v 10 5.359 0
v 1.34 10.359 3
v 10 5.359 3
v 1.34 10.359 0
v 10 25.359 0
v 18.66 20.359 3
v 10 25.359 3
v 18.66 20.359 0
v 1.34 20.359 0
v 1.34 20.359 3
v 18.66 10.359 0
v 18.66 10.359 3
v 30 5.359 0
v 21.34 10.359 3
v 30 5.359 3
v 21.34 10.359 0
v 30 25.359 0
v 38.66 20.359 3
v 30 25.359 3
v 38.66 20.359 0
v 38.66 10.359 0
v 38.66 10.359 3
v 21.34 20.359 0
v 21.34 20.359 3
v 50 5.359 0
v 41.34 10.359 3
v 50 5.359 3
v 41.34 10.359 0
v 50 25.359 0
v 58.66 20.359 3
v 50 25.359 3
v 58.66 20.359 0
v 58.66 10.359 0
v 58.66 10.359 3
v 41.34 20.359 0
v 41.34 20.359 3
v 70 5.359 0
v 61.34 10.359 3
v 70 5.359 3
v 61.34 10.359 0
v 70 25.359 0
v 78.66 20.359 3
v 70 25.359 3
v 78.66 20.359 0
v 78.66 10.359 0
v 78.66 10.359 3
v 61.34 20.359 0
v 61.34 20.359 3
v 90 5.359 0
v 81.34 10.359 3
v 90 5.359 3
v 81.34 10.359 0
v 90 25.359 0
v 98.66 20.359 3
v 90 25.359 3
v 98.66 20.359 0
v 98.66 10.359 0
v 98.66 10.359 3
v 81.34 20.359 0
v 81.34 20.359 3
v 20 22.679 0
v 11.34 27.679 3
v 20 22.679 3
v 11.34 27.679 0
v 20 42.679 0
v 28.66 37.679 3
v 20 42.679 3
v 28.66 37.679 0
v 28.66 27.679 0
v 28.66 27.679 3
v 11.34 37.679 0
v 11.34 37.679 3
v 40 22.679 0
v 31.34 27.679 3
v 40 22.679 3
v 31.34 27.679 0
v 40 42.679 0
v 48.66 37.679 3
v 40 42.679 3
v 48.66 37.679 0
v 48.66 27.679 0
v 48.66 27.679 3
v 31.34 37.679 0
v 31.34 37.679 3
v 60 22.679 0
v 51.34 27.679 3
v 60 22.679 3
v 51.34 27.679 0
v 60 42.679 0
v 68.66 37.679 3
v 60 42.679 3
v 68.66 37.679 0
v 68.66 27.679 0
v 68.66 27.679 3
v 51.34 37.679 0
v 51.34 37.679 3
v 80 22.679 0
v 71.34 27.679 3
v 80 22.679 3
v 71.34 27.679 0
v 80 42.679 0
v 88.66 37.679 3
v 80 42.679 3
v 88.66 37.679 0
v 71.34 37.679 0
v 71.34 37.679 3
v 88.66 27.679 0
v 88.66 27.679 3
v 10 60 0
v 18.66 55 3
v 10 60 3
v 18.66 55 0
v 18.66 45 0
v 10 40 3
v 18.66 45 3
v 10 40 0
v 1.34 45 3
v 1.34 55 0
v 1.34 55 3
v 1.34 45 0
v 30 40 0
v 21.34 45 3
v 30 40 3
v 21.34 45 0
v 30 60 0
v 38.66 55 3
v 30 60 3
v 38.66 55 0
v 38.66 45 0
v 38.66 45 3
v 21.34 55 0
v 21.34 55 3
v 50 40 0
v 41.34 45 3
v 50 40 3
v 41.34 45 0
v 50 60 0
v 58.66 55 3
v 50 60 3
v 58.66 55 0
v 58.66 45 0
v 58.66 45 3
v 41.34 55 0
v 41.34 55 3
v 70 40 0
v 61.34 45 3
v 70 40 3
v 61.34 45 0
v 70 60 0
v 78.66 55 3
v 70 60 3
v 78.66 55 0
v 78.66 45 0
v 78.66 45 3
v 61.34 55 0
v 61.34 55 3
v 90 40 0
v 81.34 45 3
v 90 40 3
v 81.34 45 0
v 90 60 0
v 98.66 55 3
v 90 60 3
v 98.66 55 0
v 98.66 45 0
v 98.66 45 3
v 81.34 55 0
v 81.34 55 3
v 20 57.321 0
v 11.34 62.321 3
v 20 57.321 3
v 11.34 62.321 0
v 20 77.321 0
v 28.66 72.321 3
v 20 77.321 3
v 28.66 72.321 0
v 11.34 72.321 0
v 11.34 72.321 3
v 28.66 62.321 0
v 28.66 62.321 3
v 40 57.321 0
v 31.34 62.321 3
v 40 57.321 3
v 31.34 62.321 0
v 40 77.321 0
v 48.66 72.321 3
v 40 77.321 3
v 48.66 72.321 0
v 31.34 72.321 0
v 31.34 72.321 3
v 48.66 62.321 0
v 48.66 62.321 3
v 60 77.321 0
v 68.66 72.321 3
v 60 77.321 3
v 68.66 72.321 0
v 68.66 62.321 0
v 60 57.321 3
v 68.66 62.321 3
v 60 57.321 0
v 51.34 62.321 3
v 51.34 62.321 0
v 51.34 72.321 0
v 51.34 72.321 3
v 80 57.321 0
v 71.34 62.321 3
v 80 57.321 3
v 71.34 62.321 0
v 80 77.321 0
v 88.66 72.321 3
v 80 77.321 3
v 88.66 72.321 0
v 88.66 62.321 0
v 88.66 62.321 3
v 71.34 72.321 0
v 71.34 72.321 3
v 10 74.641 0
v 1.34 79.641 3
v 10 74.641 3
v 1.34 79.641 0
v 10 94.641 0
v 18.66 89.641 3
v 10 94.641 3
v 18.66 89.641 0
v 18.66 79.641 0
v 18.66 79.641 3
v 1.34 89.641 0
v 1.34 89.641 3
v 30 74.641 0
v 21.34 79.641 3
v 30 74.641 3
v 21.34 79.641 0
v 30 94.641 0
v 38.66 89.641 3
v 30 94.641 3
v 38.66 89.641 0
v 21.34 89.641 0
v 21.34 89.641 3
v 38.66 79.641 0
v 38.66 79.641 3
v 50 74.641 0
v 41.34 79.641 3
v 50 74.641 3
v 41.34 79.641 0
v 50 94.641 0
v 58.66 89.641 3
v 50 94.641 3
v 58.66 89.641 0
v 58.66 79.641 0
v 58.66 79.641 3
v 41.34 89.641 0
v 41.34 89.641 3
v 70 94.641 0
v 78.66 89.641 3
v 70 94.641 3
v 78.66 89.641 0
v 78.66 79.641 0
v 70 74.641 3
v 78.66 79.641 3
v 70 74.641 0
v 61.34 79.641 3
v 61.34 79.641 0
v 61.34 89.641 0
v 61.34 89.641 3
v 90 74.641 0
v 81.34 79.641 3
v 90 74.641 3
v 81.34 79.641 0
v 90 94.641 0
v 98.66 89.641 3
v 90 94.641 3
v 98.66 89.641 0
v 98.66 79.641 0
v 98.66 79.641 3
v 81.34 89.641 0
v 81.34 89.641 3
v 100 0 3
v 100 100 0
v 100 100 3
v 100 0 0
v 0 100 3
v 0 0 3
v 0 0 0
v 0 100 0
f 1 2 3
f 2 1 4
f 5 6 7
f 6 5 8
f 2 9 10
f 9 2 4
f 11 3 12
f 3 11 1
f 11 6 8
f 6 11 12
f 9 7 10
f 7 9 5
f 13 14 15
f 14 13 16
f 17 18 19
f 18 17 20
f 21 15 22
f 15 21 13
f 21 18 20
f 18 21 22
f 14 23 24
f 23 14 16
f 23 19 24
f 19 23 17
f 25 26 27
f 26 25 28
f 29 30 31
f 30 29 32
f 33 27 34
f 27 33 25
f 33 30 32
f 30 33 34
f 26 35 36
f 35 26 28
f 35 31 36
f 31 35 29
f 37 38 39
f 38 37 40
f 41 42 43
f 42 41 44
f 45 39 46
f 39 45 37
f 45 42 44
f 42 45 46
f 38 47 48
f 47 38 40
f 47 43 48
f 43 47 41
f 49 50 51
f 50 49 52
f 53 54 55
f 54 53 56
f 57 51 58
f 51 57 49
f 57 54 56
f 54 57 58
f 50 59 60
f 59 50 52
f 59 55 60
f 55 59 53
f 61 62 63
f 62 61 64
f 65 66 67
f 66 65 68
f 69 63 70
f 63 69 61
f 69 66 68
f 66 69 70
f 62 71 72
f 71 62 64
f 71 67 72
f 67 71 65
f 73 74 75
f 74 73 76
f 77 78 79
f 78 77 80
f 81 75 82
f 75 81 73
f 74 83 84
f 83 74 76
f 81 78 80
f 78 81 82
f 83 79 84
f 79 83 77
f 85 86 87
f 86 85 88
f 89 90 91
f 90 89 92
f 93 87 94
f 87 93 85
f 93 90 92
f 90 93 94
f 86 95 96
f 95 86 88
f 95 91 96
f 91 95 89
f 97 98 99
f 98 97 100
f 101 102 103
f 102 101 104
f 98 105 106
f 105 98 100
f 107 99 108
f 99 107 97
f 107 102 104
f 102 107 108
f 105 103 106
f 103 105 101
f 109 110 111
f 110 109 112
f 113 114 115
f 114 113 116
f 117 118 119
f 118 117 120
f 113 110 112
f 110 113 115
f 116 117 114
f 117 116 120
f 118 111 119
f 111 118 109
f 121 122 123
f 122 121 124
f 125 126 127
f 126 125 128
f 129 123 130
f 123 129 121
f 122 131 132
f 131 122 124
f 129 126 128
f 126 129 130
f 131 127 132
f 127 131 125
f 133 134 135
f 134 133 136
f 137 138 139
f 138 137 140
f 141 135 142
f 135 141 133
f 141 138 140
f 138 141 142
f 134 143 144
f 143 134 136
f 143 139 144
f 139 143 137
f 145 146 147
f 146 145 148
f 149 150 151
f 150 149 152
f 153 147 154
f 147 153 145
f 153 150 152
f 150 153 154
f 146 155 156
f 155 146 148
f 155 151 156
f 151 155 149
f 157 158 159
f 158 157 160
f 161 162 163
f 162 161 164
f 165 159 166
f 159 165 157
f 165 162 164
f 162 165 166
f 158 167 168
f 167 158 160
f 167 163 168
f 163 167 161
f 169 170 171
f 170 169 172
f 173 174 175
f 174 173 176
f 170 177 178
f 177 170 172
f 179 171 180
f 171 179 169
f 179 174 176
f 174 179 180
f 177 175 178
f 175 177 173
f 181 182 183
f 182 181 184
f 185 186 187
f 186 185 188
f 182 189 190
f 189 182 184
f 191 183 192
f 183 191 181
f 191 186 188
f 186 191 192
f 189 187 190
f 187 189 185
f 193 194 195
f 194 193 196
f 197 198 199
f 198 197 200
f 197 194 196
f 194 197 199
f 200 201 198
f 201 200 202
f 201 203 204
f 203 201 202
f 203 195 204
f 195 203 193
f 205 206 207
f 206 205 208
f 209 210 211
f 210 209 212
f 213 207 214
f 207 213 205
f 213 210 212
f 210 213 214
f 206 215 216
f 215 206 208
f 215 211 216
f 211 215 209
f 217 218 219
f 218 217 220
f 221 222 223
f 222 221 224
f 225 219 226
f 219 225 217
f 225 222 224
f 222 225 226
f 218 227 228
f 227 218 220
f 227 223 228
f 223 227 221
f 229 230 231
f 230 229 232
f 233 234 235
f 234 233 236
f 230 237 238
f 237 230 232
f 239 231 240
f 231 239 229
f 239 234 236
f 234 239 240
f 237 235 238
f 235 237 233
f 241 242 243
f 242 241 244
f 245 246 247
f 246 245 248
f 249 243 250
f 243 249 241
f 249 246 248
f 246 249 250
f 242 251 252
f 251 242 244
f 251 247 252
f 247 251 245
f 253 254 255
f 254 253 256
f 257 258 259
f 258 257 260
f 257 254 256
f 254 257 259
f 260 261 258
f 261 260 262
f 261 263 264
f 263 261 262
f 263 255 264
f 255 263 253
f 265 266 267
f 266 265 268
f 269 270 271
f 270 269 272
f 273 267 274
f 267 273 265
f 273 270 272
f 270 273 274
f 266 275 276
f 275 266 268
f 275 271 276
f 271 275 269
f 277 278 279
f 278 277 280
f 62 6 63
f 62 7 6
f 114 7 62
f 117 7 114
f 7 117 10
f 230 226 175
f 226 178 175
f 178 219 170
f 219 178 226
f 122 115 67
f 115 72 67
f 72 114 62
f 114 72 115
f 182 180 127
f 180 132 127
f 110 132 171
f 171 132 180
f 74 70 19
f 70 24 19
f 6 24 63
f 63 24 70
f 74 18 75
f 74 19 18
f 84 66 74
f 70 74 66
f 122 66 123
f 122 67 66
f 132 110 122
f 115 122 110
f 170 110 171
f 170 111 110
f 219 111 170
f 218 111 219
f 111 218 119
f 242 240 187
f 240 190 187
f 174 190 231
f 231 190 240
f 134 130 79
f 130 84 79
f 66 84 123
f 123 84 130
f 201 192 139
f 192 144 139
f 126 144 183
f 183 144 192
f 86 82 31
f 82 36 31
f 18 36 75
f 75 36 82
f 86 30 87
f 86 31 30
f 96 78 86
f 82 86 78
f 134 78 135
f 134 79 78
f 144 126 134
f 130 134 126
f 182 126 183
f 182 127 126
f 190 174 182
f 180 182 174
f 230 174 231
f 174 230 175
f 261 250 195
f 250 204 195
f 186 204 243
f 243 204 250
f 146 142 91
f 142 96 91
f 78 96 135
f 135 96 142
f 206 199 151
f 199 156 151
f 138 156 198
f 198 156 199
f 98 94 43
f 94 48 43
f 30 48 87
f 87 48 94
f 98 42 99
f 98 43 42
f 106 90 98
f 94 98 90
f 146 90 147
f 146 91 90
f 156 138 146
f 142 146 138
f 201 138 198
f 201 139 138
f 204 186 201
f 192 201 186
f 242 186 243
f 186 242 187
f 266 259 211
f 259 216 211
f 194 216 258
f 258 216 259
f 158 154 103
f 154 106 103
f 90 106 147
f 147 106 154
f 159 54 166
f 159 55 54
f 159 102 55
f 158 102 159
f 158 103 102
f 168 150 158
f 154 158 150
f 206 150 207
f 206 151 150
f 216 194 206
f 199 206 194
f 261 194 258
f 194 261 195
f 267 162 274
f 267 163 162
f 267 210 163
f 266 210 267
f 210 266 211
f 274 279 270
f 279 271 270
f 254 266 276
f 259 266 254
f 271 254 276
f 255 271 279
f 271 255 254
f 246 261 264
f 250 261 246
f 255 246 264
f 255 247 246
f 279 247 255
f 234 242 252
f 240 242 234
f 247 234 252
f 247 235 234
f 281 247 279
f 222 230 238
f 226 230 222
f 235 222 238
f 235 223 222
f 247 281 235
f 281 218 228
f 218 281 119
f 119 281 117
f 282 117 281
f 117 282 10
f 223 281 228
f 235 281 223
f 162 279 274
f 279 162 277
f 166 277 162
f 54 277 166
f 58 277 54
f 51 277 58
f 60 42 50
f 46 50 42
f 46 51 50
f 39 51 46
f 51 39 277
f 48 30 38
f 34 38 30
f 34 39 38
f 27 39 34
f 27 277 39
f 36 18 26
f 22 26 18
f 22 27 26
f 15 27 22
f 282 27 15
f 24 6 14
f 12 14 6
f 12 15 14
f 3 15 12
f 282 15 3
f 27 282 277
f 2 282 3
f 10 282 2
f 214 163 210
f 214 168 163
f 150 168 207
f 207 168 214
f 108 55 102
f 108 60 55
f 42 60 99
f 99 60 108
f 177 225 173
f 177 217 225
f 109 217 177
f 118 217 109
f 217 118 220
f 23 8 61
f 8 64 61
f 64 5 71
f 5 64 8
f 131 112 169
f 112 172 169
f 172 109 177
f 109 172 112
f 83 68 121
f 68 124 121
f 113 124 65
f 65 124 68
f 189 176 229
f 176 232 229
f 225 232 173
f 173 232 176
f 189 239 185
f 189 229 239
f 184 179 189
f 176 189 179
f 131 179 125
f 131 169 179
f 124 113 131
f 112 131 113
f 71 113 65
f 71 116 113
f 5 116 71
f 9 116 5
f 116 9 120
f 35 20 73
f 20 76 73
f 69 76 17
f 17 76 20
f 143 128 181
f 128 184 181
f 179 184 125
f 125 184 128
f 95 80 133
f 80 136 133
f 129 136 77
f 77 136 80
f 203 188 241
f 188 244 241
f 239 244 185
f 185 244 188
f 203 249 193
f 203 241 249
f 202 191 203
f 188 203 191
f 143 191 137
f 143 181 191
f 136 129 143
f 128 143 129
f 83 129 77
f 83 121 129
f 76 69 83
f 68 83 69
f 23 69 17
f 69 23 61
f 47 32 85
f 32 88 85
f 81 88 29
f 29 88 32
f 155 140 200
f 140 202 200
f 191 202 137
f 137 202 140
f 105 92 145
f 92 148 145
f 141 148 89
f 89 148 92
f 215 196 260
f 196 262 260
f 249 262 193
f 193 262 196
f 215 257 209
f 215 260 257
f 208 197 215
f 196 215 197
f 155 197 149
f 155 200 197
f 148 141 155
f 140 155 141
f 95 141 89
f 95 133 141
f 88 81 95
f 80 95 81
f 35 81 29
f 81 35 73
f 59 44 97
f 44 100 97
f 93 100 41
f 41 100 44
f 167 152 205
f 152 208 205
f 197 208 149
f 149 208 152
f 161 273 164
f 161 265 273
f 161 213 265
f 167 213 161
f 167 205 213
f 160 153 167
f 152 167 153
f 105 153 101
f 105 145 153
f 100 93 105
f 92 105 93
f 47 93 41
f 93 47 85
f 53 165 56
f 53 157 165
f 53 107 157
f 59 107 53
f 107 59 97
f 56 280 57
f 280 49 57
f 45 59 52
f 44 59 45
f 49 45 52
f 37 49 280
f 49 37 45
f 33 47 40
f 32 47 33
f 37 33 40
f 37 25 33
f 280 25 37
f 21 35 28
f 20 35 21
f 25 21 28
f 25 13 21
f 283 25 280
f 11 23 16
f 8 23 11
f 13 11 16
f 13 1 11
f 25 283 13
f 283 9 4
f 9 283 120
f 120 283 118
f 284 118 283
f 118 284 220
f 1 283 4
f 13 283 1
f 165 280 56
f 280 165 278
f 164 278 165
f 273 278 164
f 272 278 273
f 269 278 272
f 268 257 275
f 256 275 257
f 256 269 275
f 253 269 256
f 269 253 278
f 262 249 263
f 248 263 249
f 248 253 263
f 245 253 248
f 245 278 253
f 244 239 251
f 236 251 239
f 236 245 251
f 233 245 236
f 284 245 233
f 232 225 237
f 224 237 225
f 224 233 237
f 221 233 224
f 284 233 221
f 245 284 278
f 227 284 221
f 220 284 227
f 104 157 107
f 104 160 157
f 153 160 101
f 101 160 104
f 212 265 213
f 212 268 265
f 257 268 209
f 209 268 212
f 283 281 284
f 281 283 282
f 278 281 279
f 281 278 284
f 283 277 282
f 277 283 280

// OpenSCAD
// created by IndiePandaaaaa | Lukas

function hexagon_get_inner_diameter(single_outer_diameter = 20) = tan(60) * (single_outer_diameter / 2);

function hexagon_inbetween_distance_x(single_outer_diameter = 20) = single_outer_diameter -
    hexagon_get_inner_diameter(single_outer_diameter);

function hexagon_get_y_inner_element_additional_height(single_outer_diameter = 20) = single_outer_diameter / 2 +
        hexagon_inbetween_distance_x(single_outer_diameter) * cos(30) + (single_outer_diameter / 2) * cos(60);

function hexagon_get_y_outer_element_height(single_outer_diameter = 20) = single_outer_diameter;

function hexagon_get_y_next_structure(single_outer_diameter = 20) = (single_outer_diameter / 2 * 3) +
            hexagon_inbetween_distance_x(single_outer_diameter) * cos(30) * 2;

function hexagon_get_y_element_height(single_outer_diameter = 20) = hexagon_get_y_outer_element_height(
single_outer_diameter) + hexagon_get_y_inner_element_additional_height(single_outer_diameter);

function hexagon_get_x_element_count(width, single_outer_diameter = 20) = floor(width / single_outer_diameter);

function hexagon_get_y_element_count(depth, single_outer_diameter = 20) = floor(((depth - (hexagon_get_y_element_height(
single_outer_diameter) -
    hexagon_get_y_next_structure(single_outer_diameter))) / hexagon_get_y_next_structure(single_outer_diameter)) * 2);

function hexagon_get_used_width(width, single_outer_diameter = 20) = single_outer_diameter *
    hexagon_get_x_element_count(width, single_outer_diameter) - hexagon_inbetween_distance_x(single_outer_diameter);

//function hexagon_get_used_depth(depth, single_outer_diameter = 20) = hexagon_get_y_next_structure(single_outer_diameter)
//    * (floor(depth / hexagon_get_y_next_structure(single_outer_diameter))) + (hexagon_inbetween_distance_x(single_outer_diameter)) * cos(30);

//function hexagon_get_used_depth(depth, single_outer_diameter = 20) = (hexagon_get_y_element_count(depth,single_outer_diameter) - 1) * 
//			hexagon_get_y_next_structure(single_outer_diameter) + hexagon_get_y_element_height(single_outer_diameter);

function hexagon_get_used_depth(depth, single_outer_diameter = 20) = round(hexagon_get_y_element_count(depth,
single_outer_diameter) / 2) * hexagon_get_y_outer_element_height(single_outer_diameter) +
        floor(hexagon_get_y_element_count(depth, single_outer_diameter) / 2) * (hexagon_get_y_next_structure(
    single_outer_diameter) - single_outer_diameter) +
            (hexagon_get_y_element_count(depth, single_outer_diameter) + 1) % 2 * (hexagon_get_y_element_height(
    single_outer_diameter) - hexagon_get_y_next_structure(single_outer_diameter));

module hexagon_pattern(width, depth, thickness, single_outer_diameter = 20, vertices = 6) {
    inner_diameter = hexagon_get_inner_diameter(single_outer_diameter);

    count_x = hexagon_get_x_element_count(width, single_outer_diameter);
    count_y = hexagon_get_y_element_count(depth, single_outer_diameter);

    angle = 360 / vertices * 1.5;

    for (y = [0:count_y - 1]) {
        for (x = [0:count_x - 1]) {

            if (y % 2 == 0) {
                translate([inner_diameter / 2 + single_outer_diameter * x, (single_outer_diameter / 2) + inner_diameter
                    * y, - 0.01]) {
                    linear_extrude(height = thickness + 0.02) {
                        rotate([0, 0, angle]) circle(d = single_outer_diameter, $fn = vertices);
                    }
                }
            } else if (x < count_x - 1 && y % 2 == 1) {
                translate([inner_diameter / 2 + single_outer_diameter * x + single_outer_diameter / 2,
                        (single_outer_diameter / 2) + inner_diameter * y, - 0.01]) {
                    linear_extrude(height = thickness + 0.02) {
                        rotate([0, 0, angle]) circle(d = single_outer_diameter, $fn = vertices);
                    }
                }
            }

        }
    }
}

width = 100;
depth = 100;
difference() {
    cube([width, depth, 3]);
    translate([(width - hexagon_get_used_width(width)) / 2, (depth - hexagon_get_used_depth(depth)) / 2, 0])
        hexagon_pattern(width, depth, 3);
}
